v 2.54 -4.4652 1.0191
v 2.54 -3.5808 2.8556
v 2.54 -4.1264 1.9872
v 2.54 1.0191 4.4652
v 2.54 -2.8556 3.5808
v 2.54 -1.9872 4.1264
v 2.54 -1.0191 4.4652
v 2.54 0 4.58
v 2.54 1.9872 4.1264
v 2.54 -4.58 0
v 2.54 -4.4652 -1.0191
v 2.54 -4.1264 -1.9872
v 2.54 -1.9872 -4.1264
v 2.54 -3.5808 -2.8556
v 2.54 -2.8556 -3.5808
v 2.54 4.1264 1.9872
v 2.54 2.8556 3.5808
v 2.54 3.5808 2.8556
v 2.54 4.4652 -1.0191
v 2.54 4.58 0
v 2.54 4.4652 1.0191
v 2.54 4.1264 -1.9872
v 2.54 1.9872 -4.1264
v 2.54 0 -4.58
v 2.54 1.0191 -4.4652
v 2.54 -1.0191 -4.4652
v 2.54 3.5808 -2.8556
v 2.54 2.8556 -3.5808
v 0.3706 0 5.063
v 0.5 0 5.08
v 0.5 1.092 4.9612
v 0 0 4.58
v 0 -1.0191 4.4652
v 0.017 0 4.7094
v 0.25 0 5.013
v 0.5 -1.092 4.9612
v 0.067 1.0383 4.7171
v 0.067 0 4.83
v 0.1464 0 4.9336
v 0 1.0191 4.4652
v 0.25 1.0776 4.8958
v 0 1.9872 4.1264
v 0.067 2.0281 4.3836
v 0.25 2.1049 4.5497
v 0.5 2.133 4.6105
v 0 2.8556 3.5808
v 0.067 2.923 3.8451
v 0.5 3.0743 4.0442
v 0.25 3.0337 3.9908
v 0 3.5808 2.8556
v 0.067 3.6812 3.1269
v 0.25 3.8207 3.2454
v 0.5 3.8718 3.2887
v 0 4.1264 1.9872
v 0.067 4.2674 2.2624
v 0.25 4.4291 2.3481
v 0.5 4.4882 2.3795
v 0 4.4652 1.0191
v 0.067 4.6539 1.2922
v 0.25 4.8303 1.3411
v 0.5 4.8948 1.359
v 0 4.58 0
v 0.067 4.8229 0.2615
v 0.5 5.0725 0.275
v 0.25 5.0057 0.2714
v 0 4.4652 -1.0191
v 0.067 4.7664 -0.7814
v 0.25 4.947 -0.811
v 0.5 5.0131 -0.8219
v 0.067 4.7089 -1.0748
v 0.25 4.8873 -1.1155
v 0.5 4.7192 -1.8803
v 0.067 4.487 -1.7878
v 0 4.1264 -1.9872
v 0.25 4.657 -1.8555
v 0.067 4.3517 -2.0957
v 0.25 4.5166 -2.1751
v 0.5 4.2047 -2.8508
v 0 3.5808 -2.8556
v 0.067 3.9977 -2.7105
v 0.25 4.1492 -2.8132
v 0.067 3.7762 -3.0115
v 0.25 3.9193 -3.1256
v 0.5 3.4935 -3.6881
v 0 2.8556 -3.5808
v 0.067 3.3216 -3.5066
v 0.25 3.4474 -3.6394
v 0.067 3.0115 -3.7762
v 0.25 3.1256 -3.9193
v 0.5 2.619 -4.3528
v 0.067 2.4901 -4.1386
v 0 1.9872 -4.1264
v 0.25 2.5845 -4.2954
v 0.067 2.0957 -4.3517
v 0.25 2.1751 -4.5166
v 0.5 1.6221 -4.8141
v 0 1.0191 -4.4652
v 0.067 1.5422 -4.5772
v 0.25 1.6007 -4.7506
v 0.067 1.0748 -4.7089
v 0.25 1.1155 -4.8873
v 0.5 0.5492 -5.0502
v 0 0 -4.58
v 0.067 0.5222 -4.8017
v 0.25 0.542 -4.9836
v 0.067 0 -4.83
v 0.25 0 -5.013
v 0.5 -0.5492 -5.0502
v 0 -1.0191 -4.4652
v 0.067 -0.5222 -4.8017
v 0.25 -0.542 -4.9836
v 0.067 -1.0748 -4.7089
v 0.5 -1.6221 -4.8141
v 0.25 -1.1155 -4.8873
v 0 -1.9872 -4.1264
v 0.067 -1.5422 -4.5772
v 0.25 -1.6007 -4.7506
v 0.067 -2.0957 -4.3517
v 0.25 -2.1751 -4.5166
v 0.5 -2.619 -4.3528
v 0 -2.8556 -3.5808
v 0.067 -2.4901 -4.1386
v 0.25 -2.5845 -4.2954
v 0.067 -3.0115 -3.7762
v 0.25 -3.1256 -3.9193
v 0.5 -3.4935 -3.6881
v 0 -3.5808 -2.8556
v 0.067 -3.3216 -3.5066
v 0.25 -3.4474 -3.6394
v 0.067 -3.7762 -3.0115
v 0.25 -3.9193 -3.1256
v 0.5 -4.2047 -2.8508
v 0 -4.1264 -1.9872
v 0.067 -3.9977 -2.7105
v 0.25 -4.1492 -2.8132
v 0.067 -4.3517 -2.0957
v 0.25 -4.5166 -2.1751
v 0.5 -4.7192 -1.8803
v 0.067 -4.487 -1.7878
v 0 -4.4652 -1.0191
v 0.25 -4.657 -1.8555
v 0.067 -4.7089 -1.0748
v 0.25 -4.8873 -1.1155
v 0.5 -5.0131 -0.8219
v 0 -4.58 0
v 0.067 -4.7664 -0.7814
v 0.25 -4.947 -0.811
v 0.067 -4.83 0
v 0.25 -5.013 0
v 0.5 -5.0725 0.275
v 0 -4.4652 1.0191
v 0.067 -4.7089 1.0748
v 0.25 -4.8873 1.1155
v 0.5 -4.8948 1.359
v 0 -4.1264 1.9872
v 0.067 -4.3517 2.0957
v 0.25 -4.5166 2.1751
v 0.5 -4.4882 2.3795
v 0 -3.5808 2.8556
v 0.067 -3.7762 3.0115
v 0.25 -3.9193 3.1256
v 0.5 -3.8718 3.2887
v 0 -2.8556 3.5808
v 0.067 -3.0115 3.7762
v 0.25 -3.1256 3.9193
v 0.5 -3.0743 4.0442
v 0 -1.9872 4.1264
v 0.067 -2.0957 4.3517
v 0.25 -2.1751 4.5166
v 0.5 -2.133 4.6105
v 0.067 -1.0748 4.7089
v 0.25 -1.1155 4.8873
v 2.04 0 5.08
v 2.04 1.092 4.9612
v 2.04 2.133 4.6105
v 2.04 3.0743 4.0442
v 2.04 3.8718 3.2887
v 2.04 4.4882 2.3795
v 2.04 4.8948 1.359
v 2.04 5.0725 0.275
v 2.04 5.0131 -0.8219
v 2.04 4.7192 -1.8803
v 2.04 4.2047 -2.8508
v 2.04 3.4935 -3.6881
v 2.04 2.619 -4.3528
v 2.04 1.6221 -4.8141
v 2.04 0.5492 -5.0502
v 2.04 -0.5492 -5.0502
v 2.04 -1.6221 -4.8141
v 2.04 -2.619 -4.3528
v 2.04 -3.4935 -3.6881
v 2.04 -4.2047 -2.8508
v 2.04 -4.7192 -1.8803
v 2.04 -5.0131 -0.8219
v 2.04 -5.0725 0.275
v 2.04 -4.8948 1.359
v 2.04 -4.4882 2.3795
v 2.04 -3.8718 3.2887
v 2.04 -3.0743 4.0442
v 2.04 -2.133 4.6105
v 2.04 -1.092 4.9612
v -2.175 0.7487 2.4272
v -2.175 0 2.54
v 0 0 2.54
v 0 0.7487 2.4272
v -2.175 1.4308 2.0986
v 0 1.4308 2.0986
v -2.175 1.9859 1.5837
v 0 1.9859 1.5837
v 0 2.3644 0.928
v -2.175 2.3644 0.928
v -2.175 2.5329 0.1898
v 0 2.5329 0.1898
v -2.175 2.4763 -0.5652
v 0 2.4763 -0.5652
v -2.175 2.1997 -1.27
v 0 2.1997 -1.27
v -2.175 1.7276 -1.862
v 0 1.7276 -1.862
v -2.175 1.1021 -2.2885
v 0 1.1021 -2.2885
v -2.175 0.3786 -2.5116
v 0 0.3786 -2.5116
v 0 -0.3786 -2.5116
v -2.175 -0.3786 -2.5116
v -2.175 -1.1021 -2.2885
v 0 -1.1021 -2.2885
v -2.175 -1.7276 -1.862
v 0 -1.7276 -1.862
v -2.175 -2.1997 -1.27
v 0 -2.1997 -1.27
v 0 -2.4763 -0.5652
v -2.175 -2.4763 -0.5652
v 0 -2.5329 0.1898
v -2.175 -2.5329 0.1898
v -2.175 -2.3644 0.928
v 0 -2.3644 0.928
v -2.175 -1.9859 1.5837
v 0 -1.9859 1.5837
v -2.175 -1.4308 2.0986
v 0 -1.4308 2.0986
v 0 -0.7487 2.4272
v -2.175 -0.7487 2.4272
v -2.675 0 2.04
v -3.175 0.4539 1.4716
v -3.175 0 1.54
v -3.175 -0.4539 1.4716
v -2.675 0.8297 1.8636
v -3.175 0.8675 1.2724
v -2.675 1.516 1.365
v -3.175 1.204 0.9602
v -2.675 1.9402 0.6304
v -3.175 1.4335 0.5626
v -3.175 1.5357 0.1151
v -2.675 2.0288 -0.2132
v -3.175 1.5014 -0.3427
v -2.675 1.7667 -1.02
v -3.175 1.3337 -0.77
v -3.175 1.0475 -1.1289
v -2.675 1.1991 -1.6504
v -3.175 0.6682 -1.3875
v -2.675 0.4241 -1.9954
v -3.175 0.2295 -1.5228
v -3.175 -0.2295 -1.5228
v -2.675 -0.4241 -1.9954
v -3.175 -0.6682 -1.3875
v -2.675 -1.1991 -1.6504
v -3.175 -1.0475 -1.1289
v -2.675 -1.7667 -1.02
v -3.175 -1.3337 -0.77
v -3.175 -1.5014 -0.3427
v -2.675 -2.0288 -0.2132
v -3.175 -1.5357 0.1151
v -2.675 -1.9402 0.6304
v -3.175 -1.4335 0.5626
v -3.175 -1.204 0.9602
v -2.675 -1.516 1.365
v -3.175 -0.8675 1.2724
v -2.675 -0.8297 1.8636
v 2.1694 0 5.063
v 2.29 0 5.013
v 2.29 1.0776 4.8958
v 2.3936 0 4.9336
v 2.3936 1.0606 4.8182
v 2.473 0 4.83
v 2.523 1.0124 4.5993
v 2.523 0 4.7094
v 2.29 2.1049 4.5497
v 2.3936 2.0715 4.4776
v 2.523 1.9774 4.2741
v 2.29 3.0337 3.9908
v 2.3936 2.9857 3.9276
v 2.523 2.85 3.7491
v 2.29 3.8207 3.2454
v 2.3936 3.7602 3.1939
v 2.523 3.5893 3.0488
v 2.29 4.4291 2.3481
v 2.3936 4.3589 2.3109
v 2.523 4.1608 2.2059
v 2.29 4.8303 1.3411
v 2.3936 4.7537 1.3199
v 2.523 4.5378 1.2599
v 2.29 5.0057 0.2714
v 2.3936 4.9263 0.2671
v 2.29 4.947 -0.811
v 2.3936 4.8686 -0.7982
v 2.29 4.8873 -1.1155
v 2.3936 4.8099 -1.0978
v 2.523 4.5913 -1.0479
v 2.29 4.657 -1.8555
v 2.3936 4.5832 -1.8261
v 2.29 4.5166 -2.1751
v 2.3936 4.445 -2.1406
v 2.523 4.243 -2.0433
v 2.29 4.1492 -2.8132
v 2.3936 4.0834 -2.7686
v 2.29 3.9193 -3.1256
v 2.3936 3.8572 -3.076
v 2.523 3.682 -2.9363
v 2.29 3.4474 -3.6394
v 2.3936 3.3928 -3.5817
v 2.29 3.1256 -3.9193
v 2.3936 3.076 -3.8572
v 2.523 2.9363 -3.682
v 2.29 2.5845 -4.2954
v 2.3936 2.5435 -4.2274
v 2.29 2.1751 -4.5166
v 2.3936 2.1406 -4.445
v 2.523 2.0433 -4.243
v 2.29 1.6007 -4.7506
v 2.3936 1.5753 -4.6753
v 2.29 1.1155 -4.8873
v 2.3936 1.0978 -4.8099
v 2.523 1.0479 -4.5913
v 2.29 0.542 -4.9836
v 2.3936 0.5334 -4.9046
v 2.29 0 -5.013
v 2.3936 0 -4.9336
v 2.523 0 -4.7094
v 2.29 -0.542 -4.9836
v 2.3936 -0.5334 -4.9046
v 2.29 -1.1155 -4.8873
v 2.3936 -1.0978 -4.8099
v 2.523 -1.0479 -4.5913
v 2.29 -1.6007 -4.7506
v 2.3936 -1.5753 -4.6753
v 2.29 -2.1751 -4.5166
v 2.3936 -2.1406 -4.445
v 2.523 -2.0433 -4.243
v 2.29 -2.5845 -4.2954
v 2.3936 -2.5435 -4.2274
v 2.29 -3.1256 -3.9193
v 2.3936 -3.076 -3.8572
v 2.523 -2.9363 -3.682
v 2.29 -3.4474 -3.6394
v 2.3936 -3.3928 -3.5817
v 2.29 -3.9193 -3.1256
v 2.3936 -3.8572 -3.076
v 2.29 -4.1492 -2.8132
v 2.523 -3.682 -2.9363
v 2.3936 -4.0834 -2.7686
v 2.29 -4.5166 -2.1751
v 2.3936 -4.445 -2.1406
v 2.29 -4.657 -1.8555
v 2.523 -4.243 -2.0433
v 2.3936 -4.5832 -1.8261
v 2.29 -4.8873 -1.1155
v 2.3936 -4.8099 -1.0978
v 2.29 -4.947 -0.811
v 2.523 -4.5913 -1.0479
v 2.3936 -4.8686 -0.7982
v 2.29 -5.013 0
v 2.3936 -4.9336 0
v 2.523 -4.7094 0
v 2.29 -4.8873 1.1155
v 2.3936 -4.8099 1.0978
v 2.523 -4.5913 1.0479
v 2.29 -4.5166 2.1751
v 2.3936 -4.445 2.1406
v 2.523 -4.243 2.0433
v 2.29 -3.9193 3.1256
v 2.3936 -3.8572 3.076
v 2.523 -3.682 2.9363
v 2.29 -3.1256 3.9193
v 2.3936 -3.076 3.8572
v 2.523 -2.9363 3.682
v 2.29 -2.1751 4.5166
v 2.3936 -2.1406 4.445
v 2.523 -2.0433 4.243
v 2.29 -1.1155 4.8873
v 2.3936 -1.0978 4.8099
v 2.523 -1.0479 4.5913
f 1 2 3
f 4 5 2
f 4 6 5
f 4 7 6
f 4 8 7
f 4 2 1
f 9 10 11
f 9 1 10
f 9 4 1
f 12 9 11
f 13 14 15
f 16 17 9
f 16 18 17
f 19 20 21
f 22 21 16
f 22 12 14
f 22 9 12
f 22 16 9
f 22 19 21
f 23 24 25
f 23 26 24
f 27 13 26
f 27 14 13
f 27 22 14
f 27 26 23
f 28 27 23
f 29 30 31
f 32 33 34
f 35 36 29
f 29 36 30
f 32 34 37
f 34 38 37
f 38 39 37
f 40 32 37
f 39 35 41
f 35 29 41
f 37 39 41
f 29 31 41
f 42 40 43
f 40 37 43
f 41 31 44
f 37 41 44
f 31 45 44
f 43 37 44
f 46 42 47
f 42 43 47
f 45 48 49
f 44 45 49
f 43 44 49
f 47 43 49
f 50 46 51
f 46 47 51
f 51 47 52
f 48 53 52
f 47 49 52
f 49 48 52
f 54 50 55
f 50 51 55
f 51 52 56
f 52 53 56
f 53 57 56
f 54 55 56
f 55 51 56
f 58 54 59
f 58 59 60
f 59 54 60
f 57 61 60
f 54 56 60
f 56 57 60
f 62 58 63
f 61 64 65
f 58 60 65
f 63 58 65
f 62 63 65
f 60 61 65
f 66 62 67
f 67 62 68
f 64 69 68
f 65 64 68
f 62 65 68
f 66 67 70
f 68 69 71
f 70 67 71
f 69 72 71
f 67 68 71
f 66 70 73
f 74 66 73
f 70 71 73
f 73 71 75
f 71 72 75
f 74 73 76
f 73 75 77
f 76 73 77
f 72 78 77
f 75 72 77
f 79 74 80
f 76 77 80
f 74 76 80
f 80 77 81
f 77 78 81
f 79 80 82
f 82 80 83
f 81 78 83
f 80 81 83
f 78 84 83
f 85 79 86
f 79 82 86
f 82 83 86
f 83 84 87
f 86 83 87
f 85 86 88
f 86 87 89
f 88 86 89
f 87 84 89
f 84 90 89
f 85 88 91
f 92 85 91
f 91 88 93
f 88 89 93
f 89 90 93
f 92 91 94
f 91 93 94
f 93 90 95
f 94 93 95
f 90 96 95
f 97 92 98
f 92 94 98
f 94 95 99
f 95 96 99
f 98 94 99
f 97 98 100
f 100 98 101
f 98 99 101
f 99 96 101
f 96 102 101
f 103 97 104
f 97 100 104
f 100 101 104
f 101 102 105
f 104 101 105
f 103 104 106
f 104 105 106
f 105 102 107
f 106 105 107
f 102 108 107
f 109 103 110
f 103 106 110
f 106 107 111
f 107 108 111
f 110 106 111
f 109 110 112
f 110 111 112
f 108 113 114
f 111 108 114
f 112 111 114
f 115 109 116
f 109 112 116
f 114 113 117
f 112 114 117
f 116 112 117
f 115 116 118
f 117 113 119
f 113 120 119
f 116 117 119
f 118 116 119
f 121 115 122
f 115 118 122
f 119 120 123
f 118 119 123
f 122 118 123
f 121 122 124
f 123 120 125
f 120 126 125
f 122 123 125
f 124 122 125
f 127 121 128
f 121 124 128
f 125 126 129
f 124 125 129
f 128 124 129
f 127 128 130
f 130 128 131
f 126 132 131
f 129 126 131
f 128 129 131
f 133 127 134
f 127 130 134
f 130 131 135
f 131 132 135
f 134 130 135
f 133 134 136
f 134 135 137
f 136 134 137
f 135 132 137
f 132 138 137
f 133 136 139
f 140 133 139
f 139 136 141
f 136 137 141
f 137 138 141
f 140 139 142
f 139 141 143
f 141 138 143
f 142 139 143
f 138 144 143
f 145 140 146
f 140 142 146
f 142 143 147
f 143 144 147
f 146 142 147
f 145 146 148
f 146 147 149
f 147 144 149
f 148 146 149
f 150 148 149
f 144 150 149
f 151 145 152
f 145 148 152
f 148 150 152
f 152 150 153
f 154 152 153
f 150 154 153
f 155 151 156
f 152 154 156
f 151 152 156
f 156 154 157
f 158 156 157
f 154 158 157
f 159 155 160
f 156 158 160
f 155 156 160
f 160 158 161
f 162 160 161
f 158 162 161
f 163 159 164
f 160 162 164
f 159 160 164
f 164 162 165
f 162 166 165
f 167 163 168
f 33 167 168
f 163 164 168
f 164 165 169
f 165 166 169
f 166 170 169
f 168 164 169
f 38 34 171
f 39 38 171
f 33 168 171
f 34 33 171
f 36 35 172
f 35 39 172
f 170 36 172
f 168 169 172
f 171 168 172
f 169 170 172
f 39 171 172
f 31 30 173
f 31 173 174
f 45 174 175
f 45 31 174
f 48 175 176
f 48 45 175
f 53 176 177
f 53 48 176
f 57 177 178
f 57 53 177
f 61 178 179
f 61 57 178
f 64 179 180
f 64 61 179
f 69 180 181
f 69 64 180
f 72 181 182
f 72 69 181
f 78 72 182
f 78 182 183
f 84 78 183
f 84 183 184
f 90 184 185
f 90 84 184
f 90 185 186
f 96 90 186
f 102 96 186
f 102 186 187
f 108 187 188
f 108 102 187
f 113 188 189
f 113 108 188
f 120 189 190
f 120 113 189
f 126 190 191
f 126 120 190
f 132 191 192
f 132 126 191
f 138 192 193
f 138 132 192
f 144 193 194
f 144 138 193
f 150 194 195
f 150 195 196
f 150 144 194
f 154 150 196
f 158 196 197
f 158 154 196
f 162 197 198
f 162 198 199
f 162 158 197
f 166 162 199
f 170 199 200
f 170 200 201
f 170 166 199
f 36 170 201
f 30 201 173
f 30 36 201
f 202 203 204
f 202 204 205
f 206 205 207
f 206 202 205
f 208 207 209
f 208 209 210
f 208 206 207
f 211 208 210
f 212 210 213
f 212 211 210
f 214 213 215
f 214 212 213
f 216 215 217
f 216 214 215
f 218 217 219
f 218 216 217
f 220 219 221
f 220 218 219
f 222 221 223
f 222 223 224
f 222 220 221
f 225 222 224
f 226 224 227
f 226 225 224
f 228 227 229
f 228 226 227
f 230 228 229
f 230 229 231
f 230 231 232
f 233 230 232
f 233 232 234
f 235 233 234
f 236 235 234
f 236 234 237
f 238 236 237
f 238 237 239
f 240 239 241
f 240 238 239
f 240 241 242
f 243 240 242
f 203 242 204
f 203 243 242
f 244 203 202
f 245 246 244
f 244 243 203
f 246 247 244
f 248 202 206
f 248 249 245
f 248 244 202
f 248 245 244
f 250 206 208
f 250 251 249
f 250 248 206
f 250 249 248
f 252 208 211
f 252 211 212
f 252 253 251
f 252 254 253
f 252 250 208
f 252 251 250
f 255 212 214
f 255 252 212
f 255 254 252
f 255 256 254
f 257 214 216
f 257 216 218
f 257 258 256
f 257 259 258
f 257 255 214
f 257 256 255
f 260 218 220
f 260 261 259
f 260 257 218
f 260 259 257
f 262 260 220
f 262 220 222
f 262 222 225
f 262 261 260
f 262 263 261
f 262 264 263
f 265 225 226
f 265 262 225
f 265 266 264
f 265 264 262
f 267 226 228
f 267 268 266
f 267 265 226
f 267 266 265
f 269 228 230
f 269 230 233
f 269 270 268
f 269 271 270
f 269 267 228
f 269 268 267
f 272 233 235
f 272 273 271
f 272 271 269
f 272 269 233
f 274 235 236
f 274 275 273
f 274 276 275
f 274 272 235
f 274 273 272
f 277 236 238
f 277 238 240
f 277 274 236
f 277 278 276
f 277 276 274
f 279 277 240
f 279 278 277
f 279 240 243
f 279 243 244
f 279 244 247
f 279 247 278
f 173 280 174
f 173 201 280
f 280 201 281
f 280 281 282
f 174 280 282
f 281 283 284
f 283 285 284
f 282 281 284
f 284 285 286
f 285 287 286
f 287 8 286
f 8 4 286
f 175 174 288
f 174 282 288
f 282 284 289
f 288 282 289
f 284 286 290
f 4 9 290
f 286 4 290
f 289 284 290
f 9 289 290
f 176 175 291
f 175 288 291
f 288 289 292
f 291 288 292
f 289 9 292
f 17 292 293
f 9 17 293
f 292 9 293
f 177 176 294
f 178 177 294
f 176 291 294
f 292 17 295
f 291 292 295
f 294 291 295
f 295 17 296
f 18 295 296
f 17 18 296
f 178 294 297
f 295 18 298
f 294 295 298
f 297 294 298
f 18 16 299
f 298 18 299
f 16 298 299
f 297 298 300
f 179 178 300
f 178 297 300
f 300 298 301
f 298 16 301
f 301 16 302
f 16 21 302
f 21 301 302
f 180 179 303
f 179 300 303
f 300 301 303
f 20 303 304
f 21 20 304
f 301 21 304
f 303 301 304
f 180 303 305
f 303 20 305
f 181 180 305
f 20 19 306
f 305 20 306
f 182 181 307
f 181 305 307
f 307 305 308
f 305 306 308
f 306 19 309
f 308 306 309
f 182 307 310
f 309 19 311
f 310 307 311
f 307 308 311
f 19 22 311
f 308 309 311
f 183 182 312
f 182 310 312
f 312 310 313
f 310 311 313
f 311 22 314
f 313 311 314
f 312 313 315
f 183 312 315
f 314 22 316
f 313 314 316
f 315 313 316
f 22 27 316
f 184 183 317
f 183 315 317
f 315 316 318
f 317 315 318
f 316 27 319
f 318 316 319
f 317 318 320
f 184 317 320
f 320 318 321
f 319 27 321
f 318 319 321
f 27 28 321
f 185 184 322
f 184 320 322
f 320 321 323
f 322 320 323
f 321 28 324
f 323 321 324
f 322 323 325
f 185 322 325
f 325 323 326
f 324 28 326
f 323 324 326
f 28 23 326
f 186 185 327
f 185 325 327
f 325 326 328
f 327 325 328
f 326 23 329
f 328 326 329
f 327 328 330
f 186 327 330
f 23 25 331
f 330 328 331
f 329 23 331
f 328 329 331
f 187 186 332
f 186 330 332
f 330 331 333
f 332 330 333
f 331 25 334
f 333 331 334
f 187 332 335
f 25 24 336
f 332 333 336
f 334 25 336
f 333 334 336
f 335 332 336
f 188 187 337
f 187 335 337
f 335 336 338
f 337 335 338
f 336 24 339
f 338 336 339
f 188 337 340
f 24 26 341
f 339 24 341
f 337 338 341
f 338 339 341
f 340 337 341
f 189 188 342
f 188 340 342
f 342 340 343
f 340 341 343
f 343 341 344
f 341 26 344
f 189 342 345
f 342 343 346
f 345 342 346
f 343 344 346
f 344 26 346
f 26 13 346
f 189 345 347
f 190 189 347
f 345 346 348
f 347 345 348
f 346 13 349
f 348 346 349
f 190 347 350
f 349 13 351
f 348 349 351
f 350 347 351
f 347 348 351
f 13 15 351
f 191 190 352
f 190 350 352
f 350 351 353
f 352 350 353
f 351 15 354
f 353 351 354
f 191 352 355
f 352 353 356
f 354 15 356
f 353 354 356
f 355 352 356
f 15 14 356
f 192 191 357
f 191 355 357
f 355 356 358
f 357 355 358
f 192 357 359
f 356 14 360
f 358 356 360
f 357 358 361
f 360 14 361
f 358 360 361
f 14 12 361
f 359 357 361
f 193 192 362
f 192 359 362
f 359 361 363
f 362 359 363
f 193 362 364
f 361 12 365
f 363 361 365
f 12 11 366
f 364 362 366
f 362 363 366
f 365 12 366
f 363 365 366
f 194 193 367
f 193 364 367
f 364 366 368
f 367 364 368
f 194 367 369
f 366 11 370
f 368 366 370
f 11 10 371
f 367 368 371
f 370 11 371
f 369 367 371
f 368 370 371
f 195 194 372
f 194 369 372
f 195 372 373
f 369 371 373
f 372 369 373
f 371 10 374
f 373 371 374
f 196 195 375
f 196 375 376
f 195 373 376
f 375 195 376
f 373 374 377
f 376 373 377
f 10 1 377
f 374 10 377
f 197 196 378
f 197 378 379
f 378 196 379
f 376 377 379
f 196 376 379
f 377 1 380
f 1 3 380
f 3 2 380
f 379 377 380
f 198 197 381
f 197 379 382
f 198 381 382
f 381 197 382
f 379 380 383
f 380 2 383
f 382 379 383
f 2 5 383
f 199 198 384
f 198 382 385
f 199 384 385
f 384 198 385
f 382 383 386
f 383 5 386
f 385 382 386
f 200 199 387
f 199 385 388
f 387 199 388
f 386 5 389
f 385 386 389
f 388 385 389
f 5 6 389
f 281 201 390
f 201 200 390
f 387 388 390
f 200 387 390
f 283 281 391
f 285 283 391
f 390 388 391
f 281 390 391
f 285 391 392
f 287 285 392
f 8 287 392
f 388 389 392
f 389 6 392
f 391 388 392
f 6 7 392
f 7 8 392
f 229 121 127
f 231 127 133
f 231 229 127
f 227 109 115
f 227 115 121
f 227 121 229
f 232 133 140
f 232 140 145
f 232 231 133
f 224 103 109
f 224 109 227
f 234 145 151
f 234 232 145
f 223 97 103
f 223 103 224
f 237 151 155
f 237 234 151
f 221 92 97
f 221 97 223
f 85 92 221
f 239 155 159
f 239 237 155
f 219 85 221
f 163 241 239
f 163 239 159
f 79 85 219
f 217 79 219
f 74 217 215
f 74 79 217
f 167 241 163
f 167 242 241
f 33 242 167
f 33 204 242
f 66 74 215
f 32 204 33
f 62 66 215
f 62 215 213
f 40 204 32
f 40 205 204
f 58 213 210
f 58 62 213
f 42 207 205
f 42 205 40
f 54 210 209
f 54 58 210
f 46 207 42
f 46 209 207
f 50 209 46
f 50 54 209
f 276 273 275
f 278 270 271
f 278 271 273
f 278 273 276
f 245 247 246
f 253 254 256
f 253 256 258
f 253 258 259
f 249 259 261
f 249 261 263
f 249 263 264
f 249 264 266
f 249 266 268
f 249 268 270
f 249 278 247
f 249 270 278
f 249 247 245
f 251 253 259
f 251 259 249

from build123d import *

# Parameters (mm, degrees)
F2_SIZE = 1
F3_R    = 0.5


with BuildPart() as f1:
    # F0 (on Front) → F1 (revolve)
    with BuildSketch(Plane.XZ):
        Polygon((0, 5.08), (0, 2.54), (-3.175, 2.54), (-3.175, 0), (2.54, 0), (2.54, 5.08), align=None)
    revolve(axis=Axis((-24.3718145439, 0, 0), (-1, 0, 0)))

    # F2
    f2_edges = [f1.edges().sort_by_distance(p)[0] for p in [
        (-3.175, 0, -2.54),
    ]]
    chamfer(f2_edges, length=F2_SIZE)

    # F3
    f3_edges = [f1.edges().sort_by_distance(p)[0] for p in [
        (0, 0, -5.08),
        (2.54, 0, -5.08),
    ]]
    fillet(f3_edges, radius=F3_R)


solid = f1.part
